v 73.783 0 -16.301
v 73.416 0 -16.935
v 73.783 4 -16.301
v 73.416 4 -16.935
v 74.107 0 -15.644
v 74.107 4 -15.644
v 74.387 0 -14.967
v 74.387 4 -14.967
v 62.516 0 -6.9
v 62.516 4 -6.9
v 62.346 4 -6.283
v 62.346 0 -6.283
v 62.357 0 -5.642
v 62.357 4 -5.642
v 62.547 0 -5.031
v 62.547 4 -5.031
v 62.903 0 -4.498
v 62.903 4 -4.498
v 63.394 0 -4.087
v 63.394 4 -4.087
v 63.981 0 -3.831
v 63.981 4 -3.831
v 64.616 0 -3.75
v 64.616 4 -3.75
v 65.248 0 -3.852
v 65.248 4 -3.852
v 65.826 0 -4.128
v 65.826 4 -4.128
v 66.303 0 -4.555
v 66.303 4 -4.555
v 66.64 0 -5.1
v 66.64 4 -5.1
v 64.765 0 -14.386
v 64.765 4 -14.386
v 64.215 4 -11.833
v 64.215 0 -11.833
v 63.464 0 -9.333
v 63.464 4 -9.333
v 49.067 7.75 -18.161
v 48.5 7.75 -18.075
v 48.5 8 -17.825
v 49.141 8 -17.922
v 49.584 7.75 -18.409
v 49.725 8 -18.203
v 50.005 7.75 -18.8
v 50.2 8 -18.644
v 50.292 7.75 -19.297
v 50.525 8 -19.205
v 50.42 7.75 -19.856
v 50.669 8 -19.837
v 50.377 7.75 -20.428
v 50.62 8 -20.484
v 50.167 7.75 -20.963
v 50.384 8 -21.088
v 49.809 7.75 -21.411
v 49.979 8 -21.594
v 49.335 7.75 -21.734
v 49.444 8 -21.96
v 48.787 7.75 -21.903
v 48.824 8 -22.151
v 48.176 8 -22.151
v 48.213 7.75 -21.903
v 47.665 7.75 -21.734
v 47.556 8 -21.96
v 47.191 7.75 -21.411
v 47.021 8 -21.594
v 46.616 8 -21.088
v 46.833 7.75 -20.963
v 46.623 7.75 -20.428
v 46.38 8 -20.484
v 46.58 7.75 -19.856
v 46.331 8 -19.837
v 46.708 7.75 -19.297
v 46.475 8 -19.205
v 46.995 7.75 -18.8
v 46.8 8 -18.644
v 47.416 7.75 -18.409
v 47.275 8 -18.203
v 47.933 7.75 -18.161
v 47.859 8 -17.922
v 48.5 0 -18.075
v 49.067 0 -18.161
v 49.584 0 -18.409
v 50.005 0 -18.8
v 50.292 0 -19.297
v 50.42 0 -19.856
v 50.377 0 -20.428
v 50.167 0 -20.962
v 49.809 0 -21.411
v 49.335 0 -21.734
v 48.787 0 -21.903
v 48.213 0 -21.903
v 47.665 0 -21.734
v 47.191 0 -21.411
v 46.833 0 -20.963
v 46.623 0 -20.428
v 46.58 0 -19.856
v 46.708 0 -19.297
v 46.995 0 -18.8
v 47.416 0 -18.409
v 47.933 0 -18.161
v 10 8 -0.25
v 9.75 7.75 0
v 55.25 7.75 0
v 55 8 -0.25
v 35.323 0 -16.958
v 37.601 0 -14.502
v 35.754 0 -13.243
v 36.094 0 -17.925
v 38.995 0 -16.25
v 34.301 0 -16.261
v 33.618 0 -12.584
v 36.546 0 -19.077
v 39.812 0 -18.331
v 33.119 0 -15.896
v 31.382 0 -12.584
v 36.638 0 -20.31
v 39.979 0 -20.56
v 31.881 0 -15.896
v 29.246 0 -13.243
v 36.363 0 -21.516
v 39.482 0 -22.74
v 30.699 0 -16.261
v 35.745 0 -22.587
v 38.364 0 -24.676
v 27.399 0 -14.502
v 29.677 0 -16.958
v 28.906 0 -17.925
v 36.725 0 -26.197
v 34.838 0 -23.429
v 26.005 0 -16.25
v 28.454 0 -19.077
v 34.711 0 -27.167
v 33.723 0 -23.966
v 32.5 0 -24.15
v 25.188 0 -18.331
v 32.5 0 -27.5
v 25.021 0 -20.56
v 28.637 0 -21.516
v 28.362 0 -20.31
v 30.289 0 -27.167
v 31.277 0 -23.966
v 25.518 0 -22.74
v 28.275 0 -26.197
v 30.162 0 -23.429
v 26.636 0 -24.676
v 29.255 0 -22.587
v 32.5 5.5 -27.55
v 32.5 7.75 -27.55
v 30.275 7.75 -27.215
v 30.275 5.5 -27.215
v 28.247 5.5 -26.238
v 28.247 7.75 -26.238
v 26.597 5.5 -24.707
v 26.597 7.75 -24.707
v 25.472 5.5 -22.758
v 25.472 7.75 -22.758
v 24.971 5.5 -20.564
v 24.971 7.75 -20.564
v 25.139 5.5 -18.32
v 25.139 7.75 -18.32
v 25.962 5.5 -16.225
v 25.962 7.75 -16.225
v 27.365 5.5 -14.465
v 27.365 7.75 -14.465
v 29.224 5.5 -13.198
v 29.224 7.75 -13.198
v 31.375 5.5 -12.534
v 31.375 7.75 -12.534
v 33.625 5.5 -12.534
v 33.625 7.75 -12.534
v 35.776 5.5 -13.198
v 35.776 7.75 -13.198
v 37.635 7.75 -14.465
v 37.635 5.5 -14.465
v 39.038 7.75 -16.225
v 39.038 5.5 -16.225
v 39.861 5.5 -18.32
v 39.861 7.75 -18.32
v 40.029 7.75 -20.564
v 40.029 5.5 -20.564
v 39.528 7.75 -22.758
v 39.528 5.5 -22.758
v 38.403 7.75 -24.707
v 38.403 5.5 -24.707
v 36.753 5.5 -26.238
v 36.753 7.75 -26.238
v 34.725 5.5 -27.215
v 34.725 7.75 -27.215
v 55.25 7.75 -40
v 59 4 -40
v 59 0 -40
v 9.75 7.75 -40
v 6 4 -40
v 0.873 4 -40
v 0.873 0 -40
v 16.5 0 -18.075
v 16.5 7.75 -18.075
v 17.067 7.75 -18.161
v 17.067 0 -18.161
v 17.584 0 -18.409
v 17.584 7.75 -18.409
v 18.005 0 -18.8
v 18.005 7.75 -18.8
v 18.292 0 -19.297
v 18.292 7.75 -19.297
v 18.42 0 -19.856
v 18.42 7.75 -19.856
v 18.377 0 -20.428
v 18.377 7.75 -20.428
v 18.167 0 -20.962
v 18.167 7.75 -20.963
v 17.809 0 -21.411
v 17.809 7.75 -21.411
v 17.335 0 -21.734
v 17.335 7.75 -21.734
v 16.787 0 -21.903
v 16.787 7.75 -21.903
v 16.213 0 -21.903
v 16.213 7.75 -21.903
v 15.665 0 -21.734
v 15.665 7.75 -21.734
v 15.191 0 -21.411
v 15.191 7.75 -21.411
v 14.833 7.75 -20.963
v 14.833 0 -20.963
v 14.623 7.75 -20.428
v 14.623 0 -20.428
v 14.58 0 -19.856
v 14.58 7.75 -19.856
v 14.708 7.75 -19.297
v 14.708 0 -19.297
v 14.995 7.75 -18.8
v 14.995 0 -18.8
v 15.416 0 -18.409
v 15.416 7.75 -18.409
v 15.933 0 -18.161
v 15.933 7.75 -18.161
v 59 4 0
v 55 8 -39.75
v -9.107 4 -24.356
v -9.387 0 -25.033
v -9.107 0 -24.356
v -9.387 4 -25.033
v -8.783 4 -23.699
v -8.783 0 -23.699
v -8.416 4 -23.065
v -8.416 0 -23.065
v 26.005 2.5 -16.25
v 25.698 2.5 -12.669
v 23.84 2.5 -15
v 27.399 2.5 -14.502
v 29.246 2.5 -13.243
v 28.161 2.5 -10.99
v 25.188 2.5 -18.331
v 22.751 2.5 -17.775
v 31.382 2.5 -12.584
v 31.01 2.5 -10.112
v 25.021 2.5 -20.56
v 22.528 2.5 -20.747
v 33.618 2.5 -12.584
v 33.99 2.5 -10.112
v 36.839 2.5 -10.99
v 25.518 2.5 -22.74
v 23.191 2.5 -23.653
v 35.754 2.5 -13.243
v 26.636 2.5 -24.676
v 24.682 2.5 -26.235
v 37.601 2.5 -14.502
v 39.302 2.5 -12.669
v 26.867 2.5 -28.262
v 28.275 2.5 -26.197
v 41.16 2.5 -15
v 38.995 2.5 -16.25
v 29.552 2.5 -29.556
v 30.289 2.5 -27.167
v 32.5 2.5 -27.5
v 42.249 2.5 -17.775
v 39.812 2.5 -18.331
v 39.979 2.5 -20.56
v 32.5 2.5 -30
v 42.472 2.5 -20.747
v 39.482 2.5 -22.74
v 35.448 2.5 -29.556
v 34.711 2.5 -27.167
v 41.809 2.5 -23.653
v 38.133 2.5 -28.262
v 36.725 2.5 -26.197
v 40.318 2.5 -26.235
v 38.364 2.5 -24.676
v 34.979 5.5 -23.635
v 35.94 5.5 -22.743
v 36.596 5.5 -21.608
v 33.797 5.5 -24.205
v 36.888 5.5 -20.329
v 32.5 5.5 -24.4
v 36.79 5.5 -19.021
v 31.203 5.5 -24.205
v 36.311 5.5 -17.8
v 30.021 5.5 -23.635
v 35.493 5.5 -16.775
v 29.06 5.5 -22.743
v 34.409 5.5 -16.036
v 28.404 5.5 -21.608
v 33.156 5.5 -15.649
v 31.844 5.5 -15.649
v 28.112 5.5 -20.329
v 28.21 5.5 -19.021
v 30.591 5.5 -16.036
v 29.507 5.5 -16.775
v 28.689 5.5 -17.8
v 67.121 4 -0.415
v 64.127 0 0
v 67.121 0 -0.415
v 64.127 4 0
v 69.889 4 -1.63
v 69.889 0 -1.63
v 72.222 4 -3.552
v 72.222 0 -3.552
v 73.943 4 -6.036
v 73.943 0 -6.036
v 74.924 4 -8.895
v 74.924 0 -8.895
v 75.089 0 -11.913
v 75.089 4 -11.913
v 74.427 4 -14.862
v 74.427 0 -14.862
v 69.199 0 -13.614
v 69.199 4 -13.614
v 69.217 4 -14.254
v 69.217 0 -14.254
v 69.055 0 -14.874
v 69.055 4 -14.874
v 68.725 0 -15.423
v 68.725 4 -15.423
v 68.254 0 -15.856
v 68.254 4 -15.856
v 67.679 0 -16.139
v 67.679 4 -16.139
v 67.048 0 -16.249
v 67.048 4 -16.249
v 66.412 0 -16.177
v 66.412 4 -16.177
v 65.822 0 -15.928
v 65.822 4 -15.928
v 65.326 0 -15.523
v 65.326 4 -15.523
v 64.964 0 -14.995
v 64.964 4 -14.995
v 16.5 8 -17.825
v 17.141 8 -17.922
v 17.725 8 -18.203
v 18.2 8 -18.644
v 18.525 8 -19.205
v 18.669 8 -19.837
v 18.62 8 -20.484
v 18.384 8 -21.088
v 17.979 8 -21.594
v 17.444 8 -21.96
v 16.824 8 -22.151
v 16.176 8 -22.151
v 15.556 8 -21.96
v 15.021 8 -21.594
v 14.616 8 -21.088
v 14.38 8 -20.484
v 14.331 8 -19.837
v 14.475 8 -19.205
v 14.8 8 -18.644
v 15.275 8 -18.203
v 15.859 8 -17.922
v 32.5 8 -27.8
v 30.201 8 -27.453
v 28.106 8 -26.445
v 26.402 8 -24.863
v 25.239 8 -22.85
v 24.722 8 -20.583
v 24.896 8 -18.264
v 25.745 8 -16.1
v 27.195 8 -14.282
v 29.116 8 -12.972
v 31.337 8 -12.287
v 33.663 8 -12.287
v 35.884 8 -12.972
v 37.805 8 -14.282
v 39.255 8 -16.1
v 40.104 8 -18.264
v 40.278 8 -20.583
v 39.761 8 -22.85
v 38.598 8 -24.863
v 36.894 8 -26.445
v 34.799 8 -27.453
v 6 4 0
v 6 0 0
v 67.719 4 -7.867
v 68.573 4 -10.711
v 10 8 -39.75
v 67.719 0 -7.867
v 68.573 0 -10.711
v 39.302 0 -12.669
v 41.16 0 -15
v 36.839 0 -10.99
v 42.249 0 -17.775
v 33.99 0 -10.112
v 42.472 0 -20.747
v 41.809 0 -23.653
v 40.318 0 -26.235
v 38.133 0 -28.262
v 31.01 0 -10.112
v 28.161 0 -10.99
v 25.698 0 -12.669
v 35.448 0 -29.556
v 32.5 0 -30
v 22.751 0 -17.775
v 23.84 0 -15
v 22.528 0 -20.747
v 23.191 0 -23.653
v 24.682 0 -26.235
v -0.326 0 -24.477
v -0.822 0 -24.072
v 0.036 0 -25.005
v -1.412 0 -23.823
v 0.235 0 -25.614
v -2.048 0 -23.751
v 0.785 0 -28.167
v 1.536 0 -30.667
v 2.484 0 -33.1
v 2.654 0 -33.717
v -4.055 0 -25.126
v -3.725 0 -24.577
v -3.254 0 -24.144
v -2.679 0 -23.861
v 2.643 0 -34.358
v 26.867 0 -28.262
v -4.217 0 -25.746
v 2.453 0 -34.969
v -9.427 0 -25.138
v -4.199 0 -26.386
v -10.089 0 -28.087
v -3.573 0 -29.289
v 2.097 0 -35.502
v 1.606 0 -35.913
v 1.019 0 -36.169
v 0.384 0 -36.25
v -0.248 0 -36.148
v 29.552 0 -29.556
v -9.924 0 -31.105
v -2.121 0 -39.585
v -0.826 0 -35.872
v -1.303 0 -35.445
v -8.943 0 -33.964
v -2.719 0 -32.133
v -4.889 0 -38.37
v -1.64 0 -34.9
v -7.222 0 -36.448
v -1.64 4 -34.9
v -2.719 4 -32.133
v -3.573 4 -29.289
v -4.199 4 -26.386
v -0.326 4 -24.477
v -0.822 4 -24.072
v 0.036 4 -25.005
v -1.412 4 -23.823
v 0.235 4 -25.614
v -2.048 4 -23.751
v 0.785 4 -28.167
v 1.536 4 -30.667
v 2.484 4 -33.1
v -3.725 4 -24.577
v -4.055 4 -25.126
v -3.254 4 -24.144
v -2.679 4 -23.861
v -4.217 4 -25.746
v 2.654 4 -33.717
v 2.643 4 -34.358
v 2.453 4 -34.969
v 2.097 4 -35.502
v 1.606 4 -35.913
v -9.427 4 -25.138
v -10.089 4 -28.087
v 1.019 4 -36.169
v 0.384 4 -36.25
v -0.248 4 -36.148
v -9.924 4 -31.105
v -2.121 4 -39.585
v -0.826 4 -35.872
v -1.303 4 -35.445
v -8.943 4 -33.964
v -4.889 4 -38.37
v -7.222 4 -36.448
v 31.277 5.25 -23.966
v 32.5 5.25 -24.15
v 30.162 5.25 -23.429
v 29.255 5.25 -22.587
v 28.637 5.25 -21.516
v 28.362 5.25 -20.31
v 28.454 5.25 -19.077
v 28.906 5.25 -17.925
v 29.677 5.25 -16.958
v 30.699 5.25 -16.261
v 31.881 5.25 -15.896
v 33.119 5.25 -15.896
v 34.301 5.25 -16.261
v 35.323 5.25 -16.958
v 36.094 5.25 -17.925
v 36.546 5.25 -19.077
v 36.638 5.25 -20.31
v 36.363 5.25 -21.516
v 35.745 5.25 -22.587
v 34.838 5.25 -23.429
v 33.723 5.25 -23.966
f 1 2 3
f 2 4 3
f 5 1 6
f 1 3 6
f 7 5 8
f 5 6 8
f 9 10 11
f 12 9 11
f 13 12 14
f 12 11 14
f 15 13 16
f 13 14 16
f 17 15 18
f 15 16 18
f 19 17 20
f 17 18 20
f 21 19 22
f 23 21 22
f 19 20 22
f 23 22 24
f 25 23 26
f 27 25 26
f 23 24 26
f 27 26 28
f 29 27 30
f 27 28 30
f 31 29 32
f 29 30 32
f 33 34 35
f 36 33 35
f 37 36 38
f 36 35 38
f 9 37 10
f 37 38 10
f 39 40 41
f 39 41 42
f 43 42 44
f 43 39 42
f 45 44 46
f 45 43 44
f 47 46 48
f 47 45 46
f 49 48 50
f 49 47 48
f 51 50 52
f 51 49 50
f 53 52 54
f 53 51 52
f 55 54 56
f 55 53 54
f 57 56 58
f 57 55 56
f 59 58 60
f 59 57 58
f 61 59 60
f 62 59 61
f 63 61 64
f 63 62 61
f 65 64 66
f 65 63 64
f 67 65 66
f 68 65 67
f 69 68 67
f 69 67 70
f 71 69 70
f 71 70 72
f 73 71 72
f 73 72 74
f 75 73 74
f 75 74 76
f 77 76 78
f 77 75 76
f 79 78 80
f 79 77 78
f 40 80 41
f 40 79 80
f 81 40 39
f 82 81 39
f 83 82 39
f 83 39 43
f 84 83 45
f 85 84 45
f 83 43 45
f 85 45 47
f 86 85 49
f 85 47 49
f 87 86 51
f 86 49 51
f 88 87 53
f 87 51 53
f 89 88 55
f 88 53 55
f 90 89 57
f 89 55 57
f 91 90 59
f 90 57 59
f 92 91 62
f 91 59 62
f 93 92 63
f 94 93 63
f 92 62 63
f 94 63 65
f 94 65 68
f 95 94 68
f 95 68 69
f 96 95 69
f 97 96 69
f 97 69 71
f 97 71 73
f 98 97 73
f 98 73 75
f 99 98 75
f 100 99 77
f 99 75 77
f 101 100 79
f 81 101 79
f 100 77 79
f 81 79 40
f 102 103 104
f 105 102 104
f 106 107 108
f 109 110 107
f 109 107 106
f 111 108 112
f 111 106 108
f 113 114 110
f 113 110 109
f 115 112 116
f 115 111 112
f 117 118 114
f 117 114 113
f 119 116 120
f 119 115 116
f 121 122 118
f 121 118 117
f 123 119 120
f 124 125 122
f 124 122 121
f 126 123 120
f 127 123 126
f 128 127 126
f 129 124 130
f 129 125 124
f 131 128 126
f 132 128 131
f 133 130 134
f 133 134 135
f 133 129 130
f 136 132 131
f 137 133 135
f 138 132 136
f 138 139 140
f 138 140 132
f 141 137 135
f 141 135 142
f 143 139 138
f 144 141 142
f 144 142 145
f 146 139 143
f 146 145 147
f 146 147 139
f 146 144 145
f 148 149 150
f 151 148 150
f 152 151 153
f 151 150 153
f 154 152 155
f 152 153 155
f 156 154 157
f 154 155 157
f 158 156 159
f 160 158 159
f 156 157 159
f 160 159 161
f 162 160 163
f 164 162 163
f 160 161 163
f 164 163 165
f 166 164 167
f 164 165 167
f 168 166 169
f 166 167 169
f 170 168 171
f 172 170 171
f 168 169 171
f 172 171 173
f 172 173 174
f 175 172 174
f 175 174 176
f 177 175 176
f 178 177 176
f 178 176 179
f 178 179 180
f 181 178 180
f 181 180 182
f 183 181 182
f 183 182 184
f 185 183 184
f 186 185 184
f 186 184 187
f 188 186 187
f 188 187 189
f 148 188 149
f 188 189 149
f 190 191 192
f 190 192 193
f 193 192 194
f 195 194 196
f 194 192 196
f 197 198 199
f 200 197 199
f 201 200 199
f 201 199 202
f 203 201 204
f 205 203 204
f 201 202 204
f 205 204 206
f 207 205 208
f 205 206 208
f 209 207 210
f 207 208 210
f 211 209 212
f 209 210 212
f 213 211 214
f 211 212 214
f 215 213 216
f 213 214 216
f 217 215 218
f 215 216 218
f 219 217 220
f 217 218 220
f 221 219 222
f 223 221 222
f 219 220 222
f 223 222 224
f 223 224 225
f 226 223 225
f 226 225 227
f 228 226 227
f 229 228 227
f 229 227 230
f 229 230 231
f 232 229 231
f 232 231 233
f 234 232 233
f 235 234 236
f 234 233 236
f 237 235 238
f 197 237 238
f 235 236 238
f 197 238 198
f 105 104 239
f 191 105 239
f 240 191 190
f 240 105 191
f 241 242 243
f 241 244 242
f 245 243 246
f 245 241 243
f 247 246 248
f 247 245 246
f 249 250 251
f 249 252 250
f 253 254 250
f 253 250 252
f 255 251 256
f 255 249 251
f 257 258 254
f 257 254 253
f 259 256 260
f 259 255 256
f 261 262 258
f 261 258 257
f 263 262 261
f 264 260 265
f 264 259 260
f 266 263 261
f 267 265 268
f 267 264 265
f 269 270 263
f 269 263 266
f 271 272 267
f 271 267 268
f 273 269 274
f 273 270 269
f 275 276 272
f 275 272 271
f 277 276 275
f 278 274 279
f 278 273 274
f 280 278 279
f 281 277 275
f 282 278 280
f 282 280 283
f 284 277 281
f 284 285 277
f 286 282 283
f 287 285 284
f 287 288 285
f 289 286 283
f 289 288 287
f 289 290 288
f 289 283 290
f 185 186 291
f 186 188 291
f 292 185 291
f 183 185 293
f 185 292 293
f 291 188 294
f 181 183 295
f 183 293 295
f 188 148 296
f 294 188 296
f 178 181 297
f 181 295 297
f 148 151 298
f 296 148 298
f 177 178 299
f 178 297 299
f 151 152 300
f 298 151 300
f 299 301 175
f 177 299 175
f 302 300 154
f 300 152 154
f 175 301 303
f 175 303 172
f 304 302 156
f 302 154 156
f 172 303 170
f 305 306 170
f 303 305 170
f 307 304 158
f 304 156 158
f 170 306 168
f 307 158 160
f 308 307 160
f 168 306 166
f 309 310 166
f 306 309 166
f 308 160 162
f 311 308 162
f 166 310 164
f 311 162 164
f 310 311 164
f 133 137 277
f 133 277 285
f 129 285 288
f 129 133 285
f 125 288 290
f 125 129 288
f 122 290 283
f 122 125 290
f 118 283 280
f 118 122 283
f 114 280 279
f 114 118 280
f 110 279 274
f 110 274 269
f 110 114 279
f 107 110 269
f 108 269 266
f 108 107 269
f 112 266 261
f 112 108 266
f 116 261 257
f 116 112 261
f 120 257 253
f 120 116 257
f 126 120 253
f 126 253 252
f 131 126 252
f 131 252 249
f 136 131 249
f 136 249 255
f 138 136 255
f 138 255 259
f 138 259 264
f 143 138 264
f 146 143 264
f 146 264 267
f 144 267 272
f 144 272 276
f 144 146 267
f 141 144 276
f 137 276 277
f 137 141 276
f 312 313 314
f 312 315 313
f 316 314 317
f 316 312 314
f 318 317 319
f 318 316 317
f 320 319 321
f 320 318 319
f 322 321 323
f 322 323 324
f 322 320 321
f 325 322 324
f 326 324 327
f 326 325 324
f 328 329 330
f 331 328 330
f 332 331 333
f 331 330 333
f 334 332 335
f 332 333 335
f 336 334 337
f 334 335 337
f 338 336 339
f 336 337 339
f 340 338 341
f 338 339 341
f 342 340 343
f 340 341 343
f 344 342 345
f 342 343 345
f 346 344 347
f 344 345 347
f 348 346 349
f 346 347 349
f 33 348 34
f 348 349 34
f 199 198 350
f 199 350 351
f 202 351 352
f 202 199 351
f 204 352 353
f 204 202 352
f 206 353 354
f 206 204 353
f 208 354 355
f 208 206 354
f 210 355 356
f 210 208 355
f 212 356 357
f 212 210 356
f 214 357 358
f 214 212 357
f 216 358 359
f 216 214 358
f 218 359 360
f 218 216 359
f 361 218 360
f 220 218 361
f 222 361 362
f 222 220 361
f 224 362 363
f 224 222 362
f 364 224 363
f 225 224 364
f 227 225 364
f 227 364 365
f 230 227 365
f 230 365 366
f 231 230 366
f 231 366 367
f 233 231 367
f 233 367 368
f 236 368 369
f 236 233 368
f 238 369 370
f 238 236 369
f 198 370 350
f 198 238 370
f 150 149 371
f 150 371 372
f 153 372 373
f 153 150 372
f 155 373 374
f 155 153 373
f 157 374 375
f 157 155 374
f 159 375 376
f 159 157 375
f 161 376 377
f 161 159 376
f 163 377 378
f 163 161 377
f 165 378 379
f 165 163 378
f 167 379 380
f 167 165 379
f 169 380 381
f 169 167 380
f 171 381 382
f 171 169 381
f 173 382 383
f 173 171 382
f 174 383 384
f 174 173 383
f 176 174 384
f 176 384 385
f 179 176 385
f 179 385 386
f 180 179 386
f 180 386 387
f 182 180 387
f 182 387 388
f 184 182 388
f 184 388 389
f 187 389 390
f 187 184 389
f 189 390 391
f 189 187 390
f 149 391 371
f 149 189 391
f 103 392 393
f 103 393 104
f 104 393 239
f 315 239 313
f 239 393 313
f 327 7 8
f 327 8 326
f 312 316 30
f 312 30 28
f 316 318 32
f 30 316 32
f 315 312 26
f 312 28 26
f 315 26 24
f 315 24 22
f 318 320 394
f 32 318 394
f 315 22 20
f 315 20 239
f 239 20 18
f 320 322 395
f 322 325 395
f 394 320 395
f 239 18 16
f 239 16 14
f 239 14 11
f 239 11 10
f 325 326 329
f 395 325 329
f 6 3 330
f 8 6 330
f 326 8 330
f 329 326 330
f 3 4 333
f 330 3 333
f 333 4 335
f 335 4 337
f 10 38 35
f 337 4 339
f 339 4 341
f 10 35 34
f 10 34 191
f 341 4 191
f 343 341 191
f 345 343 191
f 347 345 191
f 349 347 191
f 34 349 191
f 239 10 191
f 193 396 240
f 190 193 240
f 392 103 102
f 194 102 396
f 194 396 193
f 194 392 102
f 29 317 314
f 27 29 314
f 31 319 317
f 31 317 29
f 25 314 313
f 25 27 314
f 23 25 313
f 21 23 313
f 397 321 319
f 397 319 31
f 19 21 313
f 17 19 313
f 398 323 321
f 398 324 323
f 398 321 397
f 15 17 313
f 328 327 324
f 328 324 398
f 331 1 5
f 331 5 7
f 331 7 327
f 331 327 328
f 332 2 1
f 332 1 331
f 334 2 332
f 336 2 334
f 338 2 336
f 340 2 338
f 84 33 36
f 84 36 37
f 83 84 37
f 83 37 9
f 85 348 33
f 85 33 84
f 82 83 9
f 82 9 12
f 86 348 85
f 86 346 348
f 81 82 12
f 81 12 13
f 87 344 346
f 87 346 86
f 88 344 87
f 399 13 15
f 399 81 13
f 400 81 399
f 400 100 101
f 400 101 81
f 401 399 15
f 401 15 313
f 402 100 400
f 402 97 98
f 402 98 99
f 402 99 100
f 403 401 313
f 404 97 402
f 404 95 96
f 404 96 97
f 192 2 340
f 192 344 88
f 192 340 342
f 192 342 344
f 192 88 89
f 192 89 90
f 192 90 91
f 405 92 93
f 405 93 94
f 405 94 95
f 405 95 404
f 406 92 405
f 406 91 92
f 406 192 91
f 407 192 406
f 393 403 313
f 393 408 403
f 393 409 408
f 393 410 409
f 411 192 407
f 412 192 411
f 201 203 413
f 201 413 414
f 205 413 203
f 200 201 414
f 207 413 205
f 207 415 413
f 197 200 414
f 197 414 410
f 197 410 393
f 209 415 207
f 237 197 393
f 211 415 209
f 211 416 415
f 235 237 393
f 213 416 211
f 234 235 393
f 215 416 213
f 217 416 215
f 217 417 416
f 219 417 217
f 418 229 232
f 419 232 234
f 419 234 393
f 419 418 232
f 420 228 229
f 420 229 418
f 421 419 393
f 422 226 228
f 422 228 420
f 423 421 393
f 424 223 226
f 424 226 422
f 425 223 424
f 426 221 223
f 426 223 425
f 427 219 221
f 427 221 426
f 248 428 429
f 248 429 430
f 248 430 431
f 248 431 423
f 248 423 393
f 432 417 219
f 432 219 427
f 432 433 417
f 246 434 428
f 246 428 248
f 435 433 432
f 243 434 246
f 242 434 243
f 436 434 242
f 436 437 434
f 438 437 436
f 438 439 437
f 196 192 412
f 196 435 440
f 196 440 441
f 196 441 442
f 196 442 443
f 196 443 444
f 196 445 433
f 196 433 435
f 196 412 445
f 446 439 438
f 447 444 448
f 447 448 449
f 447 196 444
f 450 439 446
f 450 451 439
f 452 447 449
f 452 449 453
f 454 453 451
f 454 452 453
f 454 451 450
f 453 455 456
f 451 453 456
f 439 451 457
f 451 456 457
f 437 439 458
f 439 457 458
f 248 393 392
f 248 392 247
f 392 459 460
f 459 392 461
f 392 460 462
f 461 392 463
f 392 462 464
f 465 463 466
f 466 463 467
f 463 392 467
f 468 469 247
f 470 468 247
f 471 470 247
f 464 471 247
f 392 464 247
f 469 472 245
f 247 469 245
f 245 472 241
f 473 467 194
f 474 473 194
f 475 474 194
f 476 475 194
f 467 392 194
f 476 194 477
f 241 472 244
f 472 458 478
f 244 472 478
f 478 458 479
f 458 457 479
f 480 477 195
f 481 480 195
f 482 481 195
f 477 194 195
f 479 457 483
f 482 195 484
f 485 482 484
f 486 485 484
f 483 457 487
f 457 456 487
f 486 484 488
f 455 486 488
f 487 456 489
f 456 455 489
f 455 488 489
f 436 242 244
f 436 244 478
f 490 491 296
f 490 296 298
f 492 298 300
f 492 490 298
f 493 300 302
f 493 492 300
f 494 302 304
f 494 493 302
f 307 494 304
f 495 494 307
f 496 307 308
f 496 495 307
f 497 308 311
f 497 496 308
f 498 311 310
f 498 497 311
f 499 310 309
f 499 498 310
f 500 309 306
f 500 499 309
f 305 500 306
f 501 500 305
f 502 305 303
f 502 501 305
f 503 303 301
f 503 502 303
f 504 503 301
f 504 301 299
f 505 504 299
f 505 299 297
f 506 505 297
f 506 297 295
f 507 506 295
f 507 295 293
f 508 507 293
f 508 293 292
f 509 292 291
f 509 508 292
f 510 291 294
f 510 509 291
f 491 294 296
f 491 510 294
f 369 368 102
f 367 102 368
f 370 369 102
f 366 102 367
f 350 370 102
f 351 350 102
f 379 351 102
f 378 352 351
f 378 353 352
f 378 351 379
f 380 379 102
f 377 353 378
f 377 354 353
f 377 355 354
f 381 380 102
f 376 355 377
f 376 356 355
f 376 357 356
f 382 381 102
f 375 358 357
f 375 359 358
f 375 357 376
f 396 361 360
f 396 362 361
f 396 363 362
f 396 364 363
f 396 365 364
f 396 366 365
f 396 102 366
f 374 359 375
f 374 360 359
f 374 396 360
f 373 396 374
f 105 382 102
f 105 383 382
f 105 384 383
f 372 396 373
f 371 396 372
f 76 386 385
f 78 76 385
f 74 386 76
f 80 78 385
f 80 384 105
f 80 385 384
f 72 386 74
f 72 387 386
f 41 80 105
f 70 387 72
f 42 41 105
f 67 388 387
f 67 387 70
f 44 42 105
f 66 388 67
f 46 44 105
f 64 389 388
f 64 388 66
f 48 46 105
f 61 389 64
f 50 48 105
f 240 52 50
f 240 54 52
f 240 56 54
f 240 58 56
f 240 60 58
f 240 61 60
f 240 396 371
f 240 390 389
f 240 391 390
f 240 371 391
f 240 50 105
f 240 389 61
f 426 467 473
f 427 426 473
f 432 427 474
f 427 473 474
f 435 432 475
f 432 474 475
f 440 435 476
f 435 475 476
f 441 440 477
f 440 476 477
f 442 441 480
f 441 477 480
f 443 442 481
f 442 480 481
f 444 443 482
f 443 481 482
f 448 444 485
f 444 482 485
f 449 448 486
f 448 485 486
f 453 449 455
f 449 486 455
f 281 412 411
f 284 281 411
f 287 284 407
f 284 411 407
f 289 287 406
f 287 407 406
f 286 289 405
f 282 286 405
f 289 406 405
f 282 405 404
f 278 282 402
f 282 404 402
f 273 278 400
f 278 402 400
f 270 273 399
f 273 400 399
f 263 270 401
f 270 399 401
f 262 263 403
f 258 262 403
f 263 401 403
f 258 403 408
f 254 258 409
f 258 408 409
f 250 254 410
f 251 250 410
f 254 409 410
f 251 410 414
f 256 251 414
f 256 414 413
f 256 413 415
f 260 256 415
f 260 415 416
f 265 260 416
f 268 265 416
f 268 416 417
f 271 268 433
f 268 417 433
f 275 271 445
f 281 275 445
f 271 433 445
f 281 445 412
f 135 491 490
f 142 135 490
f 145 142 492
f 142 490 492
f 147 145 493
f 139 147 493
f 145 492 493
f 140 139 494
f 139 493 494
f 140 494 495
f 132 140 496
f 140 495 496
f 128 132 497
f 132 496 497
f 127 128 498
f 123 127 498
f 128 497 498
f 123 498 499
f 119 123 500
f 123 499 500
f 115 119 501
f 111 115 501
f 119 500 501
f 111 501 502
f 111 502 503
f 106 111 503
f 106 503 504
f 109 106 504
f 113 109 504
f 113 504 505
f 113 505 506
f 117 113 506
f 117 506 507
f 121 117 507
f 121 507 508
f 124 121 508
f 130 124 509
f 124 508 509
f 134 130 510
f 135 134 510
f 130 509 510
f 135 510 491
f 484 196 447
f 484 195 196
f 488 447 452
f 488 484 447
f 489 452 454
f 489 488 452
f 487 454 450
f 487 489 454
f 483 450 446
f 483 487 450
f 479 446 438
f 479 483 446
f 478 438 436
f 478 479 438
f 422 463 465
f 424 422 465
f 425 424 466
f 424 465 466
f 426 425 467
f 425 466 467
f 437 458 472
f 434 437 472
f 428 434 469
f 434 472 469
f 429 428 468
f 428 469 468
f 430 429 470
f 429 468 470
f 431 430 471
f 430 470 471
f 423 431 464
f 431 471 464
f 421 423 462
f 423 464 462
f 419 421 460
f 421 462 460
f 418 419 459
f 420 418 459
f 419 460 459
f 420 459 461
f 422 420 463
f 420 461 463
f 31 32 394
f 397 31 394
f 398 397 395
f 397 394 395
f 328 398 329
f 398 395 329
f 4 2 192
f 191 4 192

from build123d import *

# Parameters (mm, degrees)
BASE_DEPTH                 = 4
SKETCH2_W                  = 45
SKETCH2_H                  = 40
TPS_STANDOFF_DEPTH         = 4
SKETCH4_R                  = 1.925
TPS_SCREW_HOLES_DEPTH      = 8
MOUNTING_SCREW_HOLES_DEPTH = 4
SKETCH7_R                  = 10
SKETCH7_R_2                = 7.5
O_RING_CUT_DEPTH           = 2.5
CHAMFER1_SIZE              = 4
CHAMFER3_SIZE              = 0.25
CUT_EXTRUDE3_DEPTH         = 90.532117142
CUT_EXTRUDE3_DEPTH_BACK    = 90.532117142
FILLET4_R                  = 11


with BuildPart() as part:
    # Sketch1 → Base (new body)
    with BuildSketch(Plane(origin=(0, 0, 0), x_dir=(1, 0, 0), z_dir=(0, 1, 0))):
        Polygon((-5, 40), (65, 40), (80, 0), (60, 0), (0, 0), (-15, 40), align=None)
    extrude(amount=BASE_DEPTH)

    # Sketch2 → TPS Standoff (add)
    with BuildSketch(Plane(origin=(0, 4, 0), x_dir=(1, 0, 0), z_dir=(0, 1, 0))):
        with Locations((32.5, 20)):
            Rectangle(SKETCH2_W, SKETCH2_H)
    extrude(amount=TPS_STANDOFF_DEPTH)

    # Sketch4 → TPS Screw Holes (cut)
    with BuildSketch(Plane(origin=(0, 8, 0), x_dir=(1, 0, 0), z_dir=(0, 1, 0))):
        with Locations(Location((48.5, 20, 0), (0, 0, 270))):
            Circle(SKETCH4_R)
        with Locations(Location((16.5, 20, 0), (0, 0, 270))):
            Circle(SKETCH4_R)
    extrude(amount=-TPS_SCREW_HOLES_DEPTH, mode=Mode.SUBTRACT)

    # Sketch5 → Mounting Screw Holes (cut)
    with BuildSketch(Plane(origin=(0, 4, 0), x_dir=(1, 0, 0), z_dir=(0, 1, 0))):
        with BuildLine():
            ThreePointArc((-1.640188927, 34.9), (-3.174301135, 30.719456076), (-4.19857154, 26.385714286))
            ThreePointArc((-4.19857154, 26.385714286), (-2.367593585, 23.783307759), (0.234812942, 25.614285714))
            ThreePointArc((0.234812942, 25.614285714), (1.135345982, 29.424488228), (2.484129198, 33.1))
            ThreePointArc((2.484129198, 33.1), (1.321970135, 36.062159063), (-1.640188927, 34.9))
        make_face()
        with BuildLine():
            ThreePointArc((66.640188927, 5.1), (68.174301135, 9.280543924), (69.19857154, 13.614285714))
            ThreePointArc((69.19857154, 13.614285714), (67.367593585, 16.216692241), (64.765187058, 14.385714286))
            ThreePointArc((64.765187058, 14.385714286), (63.864654018, 10.575511772), (62.515870802, 6.9))
            ThreePointArc((62.515870802, 6.9), (63.678029865, 3.937840937), (66.640188927, 5.1))
        make_face()
    extrude(amount=-MOUNTING_SCREW_HOLES_DEPTH, mode=Mode.SUBTRACT)

    # Sketch6 → TPS Shaft Bore Cut (revolve, cut)
    with BuildSketch(Plane.YZ.offset(32.5)):
        Polygon((8, -20), (0, -20), (0, -24.15), (5.5, -24.15), (5.5, -27.55), (8, -27.55), align=None)
    revolve(axis=Axis((32.5, 8, -20), (0, 1, 0)), mode=Mode.SUBTRACT)

    # Sketch7 → O-Ring Cut (cut)
    with BuildSketch(Plane.XZ):
        with Locations(Location((32.5, -20, 0), (0, 0, 270))):
            Circle(SKETCH7_R)
        with Locations(Location((32.5, -20, 0), (0, 0, 270))):
            Circle(SKETCH7_R_2, mode=Mode.SUBTRACT)
    extrude(amount=-O_RING_CUT_DEPTH, mode=Mode.SUBTRACT)

    # Chamfer1
    chamfer1_edges = [part.edges().sort_by_distance(p)[0] for p in [
        (55, 4, -20),
        (10, 4, -20),
    ]]
    chamfer(chamfer1_edges, length=CHAMFER1_SIZE - 0.0001)  # a hair under: the kernel refuses the full size

    # Chamfer3
    chamfer3_edges = [part.edges().sort_by_distance(p)[0] for p in [
        (32.5, 8, 0),
        (32.5, 8, -40),
        (48.5, 8, -21.925),
        (16.5, 8, -21.925),
        (32.5, 8, -12.45),
        (32.5, 5.5, -15.85),
    ]]
    chamfer(chamfer3_edges, length=CHAMFER3_SIZE)

    # Sketch9 → Cut-Extrude3 (cut, two sides: drawn at the far end of the back side and taken through both)
    with BuildSketch(Plane(origin=(0, 4, 0), x_dir=(1, 0, 0), z_dir=(0, 1, 0)).offset(-CUT_EXTRUDE3_DEPTH_BACK)):
        Polygon((6, 0), (-9, 24), (0, 0), align=None)
        Polygon((59, 40), (65, 40), (74, 16), align=None)
    extrude(amount=CUT_EXTRUDE3_DEPTH + CUT_EXTRUDE3_DEPTH_BACK, mode=Mode.SUBTRACT)

    # Fillet4
    fillet4_edges = [part.edges().sort_by_distance(p)[0] for p in [
        (-15, 2, -40),
        (80, 2, 0),
        (-9, 2, -24),
        (74, 2, -16),
    ]]
    fillet(fillet4_edges, radius=FILLET4_R)


solid = part.part
